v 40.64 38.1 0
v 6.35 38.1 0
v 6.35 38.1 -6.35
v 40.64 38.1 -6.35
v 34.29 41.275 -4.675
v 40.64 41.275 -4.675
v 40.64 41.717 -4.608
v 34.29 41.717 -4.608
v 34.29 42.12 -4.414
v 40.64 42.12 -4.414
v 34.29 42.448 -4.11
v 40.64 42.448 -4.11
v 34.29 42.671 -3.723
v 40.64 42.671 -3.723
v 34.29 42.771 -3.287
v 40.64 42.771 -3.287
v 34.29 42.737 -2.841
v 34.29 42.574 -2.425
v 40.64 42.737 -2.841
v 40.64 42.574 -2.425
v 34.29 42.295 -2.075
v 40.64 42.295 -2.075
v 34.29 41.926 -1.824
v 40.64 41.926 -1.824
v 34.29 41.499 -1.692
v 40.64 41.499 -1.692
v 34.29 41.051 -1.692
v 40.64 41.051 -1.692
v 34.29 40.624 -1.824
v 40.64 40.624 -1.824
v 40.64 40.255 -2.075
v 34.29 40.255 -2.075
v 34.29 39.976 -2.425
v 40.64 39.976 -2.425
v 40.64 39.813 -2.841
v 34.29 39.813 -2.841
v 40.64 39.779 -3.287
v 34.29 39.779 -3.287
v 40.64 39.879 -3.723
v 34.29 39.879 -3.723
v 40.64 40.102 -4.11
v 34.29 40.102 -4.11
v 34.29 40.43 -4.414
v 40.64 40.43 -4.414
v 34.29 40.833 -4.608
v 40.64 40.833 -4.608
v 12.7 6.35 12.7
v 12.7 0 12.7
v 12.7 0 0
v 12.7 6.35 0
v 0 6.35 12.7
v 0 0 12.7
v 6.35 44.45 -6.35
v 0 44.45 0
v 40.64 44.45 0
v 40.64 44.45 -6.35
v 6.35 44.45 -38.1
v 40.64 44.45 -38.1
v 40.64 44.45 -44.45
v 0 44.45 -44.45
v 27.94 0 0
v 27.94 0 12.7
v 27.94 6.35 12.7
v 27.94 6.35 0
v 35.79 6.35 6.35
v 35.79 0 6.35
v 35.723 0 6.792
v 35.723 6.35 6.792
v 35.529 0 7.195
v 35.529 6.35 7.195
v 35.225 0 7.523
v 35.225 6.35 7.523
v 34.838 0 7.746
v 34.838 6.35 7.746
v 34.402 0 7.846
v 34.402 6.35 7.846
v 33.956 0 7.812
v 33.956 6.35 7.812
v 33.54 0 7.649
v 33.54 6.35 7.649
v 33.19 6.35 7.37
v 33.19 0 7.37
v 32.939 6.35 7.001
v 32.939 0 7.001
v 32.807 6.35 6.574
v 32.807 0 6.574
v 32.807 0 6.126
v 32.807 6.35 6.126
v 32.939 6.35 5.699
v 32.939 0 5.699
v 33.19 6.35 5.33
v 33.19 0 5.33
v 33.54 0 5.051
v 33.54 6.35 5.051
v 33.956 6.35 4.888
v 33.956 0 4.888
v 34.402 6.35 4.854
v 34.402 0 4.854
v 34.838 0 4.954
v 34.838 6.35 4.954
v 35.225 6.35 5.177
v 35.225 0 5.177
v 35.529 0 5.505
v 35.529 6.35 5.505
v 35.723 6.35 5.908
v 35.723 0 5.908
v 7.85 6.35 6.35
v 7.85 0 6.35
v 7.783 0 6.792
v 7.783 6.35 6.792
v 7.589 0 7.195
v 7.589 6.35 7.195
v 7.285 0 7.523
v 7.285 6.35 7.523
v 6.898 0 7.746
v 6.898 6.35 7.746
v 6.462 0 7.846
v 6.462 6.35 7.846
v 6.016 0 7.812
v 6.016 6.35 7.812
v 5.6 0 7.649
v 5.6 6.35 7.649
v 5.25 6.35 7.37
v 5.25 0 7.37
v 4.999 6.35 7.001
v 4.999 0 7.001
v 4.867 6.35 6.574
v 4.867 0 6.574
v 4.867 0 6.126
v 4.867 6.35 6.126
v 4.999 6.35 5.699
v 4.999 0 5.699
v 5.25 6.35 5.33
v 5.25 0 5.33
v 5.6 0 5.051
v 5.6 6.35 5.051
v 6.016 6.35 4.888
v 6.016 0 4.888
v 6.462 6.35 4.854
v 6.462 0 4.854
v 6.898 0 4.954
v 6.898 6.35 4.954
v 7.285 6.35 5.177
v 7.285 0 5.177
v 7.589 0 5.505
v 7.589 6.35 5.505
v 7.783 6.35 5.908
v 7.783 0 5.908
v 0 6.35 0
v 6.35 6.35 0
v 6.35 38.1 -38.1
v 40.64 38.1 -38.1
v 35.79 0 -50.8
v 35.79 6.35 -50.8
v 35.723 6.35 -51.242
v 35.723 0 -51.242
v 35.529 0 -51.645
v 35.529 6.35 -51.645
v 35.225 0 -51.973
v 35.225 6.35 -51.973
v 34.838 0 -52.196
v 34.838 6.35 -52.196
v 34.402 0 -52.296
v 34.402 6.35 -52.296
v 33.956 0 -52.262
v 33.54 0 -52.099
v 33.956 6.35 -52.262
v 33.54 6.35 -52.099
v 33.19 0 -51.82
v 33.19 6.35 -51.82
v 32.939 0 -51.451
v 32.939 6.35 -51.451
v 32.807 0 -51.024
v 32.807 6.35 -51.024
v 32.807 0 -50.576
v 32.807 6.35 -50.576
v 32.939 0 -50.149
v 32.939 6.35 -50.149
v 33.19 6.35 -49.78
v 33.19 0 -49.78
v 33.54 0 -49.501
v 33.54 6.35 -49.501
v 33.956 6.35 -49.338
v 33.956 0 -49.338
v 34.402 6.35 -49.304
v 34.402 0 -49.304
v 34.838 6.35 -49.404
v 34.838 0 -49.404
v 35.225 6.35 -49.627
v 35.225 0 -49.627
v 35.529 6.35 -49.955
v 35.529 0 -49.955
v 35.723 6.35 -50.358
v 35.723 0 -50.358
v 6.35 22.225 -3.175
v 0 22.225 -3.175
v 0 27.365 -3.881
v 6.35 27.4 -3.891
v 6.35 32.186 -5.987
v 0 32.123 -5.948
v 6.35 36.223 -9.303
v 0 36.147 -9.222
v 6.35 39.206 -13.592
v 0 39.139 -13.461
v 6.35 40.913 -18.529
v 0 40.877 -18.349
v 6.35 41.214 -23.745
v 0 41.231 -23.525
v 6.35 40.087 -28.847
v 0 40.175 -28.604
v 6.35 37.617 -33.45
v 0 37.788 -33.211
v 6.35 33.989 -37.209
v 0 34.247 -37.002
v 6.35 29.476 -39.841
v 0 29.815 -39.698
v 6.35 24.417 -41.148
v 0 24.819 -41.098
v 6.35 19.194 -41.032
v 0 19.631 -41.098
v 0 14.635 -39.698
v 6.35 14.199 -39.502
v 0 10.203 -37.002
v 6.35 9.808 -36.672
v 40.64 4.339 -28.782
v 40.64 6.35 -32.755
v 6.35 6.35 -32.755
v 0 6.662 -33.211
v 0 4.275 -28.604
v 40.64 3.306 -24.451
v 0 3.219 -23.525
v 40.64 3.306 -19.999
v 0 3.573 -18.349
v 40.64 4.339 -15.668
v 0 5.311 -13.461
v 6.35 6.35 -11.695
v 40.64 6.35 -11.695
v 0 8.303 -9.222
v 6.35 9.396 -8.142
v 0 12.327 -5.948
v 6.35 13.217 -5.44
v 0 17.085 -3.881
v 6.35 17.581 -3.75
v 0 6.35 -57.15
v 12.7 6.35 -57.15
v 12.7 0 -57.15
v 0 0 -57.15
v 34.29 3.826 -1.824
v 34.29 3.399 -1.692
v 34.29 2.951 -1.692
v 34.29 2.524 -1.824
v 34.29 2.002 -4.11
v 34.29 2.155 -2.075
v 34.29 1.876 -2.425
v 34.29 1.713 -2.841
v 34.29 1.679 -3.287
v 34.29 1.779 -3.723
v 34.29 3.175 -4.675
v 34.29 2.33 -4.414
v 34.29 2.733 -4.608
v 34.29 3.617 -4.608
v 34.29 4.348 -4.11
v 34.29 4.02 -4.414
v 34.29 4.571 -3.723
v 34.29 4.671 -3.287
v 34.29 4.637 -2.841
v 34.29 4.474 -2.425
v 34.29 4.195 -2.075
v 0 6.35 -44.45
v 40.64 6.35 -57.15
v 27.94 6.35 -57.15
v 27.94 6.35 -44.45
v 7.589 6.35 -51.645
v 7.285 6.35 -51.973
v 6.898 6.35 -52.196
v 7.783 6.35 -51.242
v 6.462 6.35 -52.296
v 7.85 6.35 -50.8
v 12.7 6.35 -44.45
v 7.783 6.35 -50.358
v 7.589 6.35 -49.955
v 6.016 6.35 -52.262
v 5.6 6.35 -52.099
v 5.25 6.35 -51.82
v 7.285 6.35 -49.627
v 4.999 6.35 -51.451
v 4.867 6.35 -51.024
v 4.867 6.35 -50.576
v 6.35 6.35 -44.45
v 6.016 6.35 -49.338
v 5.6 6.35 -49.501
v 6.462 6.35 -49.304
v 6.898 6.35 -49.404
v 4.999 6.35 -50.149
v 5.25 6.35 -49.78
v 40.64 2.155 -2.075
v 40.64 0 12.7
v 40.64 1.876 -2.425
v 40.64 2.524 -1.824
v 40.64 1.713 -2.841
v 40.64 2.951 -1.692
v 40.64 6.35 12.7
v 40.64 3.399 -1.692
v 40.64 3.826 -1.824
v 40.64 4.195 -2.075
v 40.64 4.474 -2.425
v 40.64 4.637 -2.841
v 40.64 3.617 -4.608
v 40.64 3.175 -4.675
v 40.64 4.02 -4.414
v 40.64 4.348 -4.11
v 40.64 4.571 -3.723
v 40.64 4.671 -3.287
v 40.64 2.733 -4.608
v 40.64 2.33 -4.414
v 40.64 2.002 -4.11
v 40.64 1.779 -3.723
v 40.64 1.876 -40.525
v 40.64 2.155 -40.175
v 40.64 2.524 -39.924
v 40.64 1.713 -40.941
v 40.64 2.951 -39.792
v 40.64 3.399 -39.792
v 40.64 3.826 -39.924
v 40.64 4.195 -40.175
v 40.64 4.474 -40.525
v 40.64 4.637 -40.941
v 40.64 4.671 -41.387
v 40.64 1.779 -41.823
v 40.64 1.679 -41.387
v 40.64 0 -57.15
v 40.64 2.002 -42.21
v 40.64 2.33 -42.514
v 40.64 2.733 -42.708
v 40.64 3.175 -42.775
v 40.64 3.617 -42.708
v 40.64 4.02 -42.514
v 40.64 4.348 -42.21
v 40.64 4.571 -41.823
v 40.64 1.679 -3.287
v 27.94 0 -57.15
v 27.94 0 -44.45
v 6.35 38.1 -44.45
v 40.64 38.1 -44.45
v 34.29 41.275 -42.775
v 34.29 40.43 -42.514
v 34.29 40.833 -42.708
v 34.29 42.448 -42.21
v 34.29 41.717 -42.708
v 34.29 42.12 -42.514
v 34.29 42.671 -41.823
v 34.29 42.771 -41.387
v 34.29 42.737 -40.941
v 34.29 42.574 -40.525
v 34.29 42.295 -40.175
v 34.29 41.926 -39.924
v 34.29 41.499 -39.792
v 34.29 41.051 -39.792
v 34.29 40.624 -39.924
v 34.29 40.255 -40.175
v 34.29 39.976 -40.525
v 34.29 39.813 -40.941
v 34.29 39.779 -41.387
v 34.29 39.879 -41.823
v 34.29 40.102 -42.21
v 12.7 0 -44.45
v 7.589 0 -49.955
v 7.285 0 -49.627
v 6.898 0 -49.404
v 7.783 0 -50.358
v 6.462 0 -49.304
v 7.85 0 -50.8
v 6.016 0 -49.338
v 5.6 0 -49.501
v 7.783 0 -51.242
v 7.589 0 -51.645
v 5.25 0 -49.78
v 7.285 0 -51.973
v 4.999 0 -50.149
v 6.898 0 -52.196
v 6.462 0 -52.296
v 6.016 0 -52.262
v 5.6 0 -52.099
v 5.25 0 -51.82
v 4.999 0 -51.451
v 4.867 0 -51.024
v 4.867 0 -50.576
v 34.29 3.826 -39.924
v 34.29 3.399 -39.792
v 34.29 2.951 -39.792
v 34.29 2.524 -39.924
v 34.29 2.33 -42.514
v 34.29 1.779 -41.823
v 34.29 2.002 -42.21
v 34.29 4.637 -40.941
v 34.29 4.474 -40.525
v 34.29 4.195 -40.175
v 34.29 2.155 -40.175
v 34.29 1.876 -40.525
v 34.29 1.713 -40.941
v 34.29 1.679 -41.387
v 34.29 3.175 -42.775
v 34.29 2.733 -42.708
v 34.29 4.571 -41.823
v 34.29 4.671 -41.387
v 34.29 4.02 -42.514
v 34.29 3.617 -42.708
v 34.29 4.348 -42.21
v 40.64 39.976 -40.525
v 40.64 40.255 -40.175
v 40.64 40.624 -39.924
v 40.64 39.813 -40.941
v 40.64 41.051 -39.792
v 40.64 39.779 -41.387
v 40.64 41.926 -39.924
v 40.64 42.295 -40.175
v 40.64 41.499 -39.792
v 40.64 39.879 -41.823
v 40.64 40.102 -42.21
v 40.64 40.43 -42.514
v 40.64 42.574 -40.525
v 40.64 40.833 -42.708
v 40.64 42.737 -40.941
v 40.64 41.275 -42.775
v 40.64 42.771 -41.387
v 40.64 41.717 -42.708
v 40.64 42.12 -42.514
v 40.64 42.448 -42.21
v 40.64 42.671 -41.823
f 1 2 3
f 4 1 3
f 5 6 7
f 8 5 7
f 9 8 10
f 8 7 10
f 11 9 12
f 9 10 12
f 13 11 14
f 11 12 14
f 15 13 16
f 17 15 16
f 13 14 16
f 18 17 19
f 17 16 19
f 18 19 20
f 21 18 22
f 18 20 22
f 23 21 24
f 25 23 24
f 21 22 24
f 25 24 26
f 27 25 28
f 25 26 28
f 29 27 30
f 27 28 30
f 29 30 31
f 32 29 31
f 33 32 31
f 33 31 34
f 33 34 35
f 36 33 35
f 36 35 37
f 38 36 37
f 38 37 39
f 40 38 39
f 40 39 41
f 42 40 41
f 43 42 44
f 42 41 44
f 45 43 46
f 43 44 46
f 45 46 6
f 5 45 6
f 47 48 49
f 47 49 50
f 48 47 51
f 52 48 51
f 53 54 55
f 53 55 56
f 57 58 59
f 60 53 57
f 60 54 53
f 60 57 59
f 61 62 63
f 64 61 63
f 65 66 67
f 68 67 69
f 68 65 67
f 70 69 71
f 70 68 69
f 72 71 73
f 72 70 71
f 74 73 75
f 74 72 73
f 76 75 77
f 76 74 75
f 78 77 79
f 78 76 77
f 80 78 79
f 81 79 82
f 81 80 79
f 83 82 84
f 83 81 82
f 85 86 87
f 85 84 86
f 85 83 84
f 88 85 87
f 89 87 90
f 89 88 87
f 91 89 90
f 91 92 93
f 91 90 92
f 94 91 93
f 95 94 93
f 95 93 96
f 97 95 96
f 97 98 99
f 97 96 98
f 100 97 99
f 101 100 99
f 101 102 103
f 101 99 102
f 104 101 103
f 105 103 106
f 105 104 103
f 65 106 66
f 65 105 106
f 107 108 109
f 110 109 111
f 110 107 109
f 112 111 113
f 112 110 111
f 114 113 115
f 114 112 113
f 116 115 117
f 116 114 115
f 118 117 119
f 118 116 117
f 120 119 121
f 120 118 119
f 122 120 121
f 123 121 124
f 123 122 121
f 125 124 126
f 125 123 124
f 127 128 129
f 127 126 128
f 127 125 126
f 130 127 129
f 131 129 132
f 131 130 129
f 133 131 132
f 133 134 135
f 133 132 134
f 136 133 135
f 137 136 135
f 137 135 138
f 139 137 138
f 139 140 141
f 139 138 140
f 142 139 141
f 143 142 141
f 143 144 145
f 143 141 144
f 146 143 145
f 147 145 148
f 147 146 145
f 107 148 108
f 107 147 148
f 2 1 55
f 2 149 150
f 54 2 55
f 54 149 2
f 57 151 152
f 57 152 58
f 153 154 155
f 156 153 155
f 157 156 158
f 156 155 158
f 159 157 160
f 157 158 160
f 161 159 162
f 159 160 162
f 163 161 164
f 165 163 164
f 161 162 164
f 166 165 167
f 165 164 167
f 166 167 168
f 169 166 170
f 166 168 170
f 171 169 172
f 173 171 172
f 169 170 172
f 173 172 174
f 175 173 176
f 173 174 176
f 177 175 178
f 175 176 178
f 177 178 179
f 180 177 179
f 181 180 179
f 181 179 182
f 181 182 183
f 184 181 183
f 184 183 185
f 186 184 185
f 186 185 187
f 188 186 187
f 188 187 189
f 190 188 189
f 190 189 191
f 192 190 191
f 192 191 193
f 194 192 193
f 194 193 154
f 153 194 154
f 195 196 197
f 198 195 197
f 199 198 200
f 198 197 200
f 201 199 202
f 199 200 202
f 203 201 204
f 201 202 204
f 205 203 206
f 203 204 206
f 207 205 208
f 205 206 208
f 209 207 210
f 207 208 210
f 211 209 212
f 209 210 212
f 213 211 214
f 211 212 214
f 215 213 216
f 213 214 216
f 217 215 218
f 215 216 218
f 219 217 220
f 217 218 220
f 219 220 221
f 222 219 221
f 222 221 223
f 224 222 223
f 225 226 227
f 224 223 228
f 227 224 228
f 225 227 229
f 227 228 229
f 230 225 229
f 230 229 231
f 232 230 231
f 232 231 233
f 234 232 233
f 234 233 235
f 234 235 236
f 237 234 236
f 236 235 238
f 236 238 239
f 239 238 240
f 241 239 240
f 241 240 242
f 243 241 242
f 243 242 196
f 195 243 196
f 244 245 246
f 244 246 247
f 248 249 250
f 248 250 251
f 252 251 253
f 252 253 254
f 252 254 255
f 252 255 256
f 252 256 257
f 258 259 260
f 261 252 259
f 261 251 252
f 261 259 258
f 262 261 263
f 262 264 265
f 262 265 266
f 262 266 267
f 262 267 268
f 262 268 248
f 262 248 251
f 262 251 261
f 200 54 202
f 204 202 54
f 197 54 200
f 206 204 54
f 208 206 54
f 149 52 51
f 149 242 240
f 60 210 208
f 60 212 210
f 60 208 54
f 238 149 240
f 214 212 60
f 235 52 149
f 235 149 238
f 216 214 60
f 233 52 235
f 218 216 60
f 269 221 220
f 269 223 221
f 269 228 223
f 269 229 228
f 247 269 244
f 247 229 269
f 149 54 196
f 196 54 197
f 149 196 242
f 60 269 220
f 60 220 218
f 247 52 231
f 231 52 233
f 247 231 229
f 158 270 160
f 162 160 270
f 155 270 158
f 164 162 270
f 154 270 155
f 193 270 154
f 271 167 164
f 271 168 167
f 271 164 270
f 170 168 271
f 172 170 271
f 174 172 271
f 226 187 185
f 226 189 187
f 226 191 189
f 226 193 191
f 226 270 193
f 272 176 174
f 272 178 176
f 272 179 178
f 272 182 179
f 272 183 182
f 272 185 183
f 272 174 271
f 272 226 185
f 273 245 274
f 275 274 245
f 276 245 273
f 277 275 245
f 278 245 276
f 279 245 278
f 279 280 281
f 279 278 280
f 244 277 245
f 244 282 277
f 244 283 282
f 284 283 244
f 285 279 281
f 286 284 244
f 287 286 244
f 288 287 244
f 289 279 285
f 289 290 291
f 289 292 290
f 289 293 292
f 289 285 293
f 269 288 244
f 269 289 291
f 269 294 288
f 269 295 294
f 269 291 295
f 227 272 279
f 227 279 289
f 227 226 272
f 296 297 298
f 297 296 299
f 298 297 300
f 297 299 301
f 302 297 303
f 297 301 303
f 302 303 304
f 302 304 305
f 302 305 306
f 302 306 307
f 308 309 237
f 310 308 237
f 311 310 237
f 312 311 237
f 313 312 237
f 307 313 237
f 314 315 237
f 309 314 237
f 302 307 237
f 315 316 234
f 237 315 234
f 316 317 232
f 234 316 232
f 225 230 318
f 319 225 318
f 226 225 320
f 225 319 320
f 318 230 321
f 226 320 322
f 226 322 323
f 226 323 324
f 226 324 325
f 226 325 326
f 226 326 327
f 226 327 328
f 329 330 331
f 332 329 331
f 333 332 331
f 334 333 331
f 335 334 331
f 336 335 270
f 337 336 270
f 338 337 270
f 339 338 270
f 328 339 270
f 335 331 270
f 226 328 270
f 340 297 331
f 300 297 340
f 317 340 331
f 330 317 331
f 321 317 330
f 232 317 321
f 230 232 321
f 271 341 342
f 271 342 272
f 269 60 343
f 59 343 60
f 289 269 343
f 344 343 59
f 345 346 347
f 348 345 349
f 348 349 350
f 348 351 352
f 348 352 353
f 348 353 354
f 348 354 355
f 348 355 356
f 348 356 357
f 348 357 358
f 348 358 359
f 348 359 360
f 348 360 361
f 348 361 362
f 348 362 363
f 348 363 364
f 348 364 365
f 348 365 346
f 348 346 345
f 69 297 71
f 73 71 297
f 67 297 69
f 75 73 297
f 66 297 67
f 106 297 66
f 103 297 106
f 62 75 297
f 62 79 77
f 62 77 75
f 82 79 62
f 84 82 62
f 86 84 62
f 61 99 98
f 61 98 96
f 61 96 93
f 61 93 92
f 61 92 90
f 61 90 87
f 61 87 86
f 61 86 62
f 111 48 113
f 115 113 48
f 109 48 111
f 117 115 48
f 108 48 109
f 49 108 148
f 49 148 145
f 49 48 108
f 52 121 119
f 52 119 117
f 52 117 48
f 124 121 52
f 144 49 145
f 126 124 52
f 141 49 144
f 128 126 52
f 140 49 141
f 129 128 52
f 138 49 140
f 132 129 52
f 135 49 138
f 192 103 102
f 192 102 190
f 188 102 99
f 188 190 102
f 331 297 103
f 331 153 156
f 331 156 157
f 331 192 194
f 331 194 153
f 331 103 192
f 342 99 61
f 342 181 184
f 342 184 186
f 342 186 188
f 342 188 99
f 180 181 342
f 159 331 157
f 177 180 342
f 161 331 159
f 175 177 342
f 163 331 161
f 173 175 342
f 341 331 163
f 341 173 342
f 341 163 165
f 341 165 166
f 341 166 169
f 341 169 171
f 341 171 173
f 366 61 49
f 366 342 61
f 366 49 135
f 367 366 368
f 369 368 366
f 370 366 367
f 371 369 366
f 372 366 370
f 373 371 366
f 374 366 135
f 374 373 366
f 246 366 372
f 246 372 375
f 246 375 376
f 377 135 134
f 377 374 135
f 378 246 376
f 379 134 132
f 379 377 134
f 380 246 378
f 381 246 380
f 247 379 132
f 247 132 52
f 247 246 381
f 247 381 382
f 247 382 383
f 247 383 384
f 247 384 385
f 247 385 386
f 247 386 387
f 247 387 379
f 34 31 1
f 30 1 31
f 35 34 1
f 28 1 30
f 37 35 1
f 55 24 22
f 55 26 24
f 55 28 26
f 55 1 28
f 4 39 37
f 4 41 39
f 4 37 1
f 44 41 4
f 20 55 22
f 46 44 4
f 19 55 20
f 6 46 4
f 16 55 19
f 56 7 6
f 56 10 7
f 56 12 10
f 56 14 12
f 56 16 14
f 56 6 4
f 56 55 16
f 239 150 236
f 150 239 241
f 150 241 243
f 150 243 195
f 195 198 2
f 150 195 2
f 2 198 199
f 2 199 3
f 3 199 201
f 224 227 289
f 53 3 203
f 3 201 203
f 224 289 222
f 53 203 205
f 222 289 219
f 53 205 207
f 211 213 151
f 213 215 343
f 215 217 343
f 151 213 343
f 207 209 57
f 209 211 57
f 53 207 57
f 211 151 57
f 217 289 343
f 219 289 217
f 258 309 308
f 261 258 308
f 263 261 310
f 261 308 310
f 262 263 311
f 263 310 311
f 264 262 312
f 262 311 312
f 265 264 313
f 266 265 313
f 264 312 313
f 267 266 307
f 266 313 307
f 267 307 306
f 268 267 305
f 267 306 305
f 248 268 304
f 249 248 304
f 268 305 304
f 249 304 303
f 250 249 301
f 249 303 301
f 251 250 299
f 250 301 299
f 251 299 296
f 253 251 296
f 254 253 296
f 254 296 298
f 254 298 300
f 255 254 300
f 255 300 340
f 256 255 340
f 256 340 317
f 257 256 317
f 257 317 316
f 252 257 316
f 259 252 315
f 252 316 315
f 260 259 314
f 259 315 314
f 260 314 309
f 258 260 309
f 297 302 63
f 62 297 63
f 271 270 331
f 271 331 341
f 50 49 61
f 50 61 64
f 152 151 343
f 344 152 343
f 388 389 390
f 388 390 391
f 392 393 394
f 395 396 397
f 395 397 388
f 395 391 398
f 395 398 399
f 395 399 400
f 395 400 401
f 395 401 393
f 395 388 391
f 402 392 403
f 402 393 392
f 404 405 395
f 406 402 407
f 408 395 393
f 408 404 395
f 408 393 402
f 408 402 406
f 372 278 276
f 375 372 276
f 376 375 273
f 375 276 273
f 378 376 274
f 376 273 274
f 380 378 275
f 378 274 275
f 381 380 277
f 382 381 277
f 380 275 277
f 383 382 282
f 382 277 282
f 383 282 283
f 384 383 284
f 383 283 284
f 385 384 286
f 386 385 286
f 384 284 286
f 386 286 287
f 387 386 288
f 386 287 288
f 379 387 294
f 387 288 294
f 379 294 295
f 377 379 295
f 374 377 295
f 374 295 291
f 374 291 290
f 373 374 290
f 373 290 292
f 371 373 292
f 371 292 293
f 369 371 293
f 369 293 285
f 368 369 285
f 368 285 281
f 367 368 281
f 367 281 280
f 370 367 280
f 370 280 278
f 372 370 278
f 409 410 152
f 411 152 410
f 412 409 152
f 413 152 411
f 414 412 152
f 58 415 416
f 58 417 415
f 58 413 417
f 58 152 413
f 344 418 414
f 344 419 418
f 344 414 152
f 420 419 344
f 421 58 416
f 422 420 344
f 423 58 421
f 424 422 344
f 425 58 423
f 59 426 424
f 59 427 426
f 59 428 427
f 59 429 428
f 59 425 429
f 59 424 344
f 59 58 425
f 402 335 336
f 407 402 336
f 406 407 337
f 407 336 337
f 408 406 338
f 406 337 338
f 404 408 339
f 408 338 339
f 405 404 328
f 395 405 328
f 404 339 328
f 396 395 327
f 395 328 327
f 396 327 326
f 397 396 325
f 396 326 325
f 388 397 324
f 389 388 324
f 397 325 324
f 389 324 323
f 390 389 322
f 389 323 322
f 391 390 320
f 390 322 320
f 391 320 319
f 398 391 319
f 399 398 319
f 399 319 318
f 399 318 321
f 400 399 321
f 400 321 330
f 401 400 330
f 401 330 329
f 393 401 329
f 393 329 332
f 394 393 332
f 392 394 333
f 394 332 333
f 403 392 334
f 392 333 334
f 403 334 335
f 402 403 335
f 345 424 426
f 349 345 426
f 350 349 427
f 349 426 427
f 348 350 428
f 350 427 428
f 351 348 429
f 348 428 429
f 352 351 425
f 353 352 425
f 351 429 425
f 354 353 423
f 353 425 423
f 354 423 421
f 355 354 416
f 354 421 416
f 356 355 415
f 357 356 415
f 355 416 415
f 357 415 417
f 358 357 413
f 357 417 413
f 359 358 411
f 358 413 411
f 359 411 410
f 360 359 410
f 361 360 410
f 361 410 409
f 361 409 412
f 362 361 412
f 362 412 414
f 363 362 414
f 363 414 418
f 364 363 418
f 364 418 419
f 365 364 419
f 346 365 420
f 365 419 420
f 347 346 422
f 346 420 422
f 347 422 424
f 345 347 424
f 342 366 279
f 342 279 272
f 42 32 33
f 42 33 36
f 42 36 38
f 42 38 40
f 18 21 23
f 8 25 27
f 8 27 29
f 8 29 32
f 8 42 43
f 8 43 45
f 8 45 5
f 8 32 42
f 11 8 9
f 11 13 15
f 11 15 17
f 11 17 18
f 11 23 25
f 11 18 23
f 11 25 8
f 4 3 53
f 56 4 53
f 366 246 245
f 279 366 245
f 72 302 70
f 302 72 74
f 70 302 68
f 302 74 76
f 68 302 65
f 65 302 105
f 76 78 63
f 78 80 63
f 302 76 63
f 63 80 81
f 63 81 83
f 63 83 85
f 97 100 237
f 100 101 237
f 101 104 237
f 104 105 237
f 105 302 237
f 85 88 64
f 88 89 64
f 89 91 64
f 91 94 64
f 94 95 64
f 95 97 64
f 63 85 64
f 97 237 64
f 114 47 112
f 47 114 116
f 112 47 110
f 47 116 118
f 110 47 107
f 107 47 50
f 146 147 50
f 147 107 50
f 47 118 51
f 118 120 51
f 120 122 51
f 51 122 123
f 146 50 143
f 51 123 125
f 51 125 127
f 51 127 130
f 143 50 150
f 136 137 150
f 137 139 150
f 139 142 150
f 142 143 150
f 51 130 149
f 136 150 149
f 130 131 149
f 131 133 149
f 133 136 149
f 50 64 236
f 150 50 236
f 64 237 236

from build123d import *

# Parameters (mm, degrees)
SKETCH1_W           = 40.64
SKETCH1_H           = 44.45
BOSS_EXTRUDE1_DEPTH = 44.45
SKETCH4_R           = 19.05
CUT_EXTRUDE3_DEPTH  = 41.64
SKETCH5_W           = 34.29
SKETCH5_H           = 38.1
CUT_EXTRUDE4_DEPTH  = 45.45
SKETCH6_W           = 6.35
SKETCH6_H           = 6.35
BOSS_EXTRUDE2_DEPTH = 34.29
SKETCH7_R           = 1.5
CUT_EXTRUDE5_DEPTH  = 6.35
SKETCH8_W           = 12.7
SKETCH8_H           = 6.35
BOSS_EXTRUDE3_DEPTH = 12.7
SKETCH10_R          = 1.5
CUT_EXTRUDE6_DEPTH  = 12.7


with BuildPart() as part:
    # Sketch1 → Boss-Extrude1 (new body)
    with BuildSketch(Plane(origin=(0, 0, 0), x_dir=(1, 0, 0), z_dir=(0, 1, 0))):
        with Locations((20.32, 22.225)):
            Rectangle(SKETCH1_W, SKETCH1_H)
    extrude(amount=BOSS_EXTRUDE1_DEPTH)

    # Sketch4 → Cut-Extrude3 (cut, through all)
    with BuildSketch(Plane.ZY):
        with Locations((-22.225, 22.225)):
            Circle(SKETCH4_R)
    extrude(amount=-CUT_EXTRUDE3_DEPTH, mode=Mode.SUBTRACT)

    # Sketch5 → Cut-Extrude4 (cut, through all)
    with BuildSketch(Plane(origin=(0, 0, -44.45), x_dir=(-1, 0, 0), z_dir=(0, 0, -1))):
        with Locations((-23.495, 25.4)):
            Rectangle(SKETCH5_W, SKETCH5_H)
    extrude(amount=-CUT_EXTRUDE4_DEPTH, mode=Mode.SUBTRACT)

    # Sketch6 → Boss-Extrude2 (add)
    with BuildSketch(Plane(origin=(6.35, 0, 0), x_dir=(0, 0, -1), z_dir=(1, 0, 0))):
        with Locations((3.175, 41.275)):
            Rectangle(SKETCH6_W, SKETCH6_H)
        with Locations((41.275, 41.275)):
            Rectangle(SKETCH6_W, SKETCH6_H)
    extrude(amount=BOSS_EXTRUDE2_DEPTH)

    # Sketch7 → Cut-Extrude5 (cut)
    with BuildSketch(Plane(origin=(40.64, 0, 0), x_dir=(0, 0, -1), z_dir=(1, 0, 0))):
        with Locations((3.175, 41.275)):
            Circle(SKETCH7_R)
        with Locations((41.275, 41.275)):
            Circle(SKETCH7_R)
        with Locations((41.275, 3.175)):
            Circle(SKETCH7_R)
        with Locations((3.175, 3.175)):
            Circle(SKETCH7_R)
    extrude(amount=-CUT_EXTRUDE5_DEPTH, mode=Mode.SUBTRACT)

    # Sketch8 → Boss-Extrude3 (add)
    with BuildSketch(Plane(origin=(0, 0, -44.45), x_dir=(-1, 0, 0), z_dir=(0, 0, -1))):
        with Locations((-34.29, 3.175)):
            Rectangle(SKETCH8_W, SKETCH8_H)
        with Locations((-6.35, 3.175)):
            Rectangle(SKETCH8_W, SKETCH8_H)
    boss_extrude3 = extrude(amount=BOSS_EXTRUDE3_DEPTH)

    # Sketch10 → Cut-Extrude6 (cut)
    with BuildSketch(Plane(origin=(0, 6.35, 0), x_dir=(1, 0, 0), z_dir=(0, 1, 0))):
        with Locations((6.35, 50.8)):
            Circle(SKETCH10_R)
        with Locations((34.29, 50.8)):
            Circle(SKETCH10_R)
    cut_extrude6 = extrude(amount=-CUT_EXTRUDE6_DEPTH, mode=Mode.SUBTRACT)

    # Mirror1: Boss-Extrude3, Cut-Extrude6 across plane
    add(boss_extrude3.mirror(Plane(origin=(0, 0, -22.225), x_dir=(1, 0, 0), z_dir=(0, 0, -1))))
    add(cut_extrude6.mirror(Plane(origin=(0, 0, -22.225), x_dir=(1, 0, 0), z_dir=(0, 0, -1))), mode=Mode.SUBTRACT)


solid = part.part
